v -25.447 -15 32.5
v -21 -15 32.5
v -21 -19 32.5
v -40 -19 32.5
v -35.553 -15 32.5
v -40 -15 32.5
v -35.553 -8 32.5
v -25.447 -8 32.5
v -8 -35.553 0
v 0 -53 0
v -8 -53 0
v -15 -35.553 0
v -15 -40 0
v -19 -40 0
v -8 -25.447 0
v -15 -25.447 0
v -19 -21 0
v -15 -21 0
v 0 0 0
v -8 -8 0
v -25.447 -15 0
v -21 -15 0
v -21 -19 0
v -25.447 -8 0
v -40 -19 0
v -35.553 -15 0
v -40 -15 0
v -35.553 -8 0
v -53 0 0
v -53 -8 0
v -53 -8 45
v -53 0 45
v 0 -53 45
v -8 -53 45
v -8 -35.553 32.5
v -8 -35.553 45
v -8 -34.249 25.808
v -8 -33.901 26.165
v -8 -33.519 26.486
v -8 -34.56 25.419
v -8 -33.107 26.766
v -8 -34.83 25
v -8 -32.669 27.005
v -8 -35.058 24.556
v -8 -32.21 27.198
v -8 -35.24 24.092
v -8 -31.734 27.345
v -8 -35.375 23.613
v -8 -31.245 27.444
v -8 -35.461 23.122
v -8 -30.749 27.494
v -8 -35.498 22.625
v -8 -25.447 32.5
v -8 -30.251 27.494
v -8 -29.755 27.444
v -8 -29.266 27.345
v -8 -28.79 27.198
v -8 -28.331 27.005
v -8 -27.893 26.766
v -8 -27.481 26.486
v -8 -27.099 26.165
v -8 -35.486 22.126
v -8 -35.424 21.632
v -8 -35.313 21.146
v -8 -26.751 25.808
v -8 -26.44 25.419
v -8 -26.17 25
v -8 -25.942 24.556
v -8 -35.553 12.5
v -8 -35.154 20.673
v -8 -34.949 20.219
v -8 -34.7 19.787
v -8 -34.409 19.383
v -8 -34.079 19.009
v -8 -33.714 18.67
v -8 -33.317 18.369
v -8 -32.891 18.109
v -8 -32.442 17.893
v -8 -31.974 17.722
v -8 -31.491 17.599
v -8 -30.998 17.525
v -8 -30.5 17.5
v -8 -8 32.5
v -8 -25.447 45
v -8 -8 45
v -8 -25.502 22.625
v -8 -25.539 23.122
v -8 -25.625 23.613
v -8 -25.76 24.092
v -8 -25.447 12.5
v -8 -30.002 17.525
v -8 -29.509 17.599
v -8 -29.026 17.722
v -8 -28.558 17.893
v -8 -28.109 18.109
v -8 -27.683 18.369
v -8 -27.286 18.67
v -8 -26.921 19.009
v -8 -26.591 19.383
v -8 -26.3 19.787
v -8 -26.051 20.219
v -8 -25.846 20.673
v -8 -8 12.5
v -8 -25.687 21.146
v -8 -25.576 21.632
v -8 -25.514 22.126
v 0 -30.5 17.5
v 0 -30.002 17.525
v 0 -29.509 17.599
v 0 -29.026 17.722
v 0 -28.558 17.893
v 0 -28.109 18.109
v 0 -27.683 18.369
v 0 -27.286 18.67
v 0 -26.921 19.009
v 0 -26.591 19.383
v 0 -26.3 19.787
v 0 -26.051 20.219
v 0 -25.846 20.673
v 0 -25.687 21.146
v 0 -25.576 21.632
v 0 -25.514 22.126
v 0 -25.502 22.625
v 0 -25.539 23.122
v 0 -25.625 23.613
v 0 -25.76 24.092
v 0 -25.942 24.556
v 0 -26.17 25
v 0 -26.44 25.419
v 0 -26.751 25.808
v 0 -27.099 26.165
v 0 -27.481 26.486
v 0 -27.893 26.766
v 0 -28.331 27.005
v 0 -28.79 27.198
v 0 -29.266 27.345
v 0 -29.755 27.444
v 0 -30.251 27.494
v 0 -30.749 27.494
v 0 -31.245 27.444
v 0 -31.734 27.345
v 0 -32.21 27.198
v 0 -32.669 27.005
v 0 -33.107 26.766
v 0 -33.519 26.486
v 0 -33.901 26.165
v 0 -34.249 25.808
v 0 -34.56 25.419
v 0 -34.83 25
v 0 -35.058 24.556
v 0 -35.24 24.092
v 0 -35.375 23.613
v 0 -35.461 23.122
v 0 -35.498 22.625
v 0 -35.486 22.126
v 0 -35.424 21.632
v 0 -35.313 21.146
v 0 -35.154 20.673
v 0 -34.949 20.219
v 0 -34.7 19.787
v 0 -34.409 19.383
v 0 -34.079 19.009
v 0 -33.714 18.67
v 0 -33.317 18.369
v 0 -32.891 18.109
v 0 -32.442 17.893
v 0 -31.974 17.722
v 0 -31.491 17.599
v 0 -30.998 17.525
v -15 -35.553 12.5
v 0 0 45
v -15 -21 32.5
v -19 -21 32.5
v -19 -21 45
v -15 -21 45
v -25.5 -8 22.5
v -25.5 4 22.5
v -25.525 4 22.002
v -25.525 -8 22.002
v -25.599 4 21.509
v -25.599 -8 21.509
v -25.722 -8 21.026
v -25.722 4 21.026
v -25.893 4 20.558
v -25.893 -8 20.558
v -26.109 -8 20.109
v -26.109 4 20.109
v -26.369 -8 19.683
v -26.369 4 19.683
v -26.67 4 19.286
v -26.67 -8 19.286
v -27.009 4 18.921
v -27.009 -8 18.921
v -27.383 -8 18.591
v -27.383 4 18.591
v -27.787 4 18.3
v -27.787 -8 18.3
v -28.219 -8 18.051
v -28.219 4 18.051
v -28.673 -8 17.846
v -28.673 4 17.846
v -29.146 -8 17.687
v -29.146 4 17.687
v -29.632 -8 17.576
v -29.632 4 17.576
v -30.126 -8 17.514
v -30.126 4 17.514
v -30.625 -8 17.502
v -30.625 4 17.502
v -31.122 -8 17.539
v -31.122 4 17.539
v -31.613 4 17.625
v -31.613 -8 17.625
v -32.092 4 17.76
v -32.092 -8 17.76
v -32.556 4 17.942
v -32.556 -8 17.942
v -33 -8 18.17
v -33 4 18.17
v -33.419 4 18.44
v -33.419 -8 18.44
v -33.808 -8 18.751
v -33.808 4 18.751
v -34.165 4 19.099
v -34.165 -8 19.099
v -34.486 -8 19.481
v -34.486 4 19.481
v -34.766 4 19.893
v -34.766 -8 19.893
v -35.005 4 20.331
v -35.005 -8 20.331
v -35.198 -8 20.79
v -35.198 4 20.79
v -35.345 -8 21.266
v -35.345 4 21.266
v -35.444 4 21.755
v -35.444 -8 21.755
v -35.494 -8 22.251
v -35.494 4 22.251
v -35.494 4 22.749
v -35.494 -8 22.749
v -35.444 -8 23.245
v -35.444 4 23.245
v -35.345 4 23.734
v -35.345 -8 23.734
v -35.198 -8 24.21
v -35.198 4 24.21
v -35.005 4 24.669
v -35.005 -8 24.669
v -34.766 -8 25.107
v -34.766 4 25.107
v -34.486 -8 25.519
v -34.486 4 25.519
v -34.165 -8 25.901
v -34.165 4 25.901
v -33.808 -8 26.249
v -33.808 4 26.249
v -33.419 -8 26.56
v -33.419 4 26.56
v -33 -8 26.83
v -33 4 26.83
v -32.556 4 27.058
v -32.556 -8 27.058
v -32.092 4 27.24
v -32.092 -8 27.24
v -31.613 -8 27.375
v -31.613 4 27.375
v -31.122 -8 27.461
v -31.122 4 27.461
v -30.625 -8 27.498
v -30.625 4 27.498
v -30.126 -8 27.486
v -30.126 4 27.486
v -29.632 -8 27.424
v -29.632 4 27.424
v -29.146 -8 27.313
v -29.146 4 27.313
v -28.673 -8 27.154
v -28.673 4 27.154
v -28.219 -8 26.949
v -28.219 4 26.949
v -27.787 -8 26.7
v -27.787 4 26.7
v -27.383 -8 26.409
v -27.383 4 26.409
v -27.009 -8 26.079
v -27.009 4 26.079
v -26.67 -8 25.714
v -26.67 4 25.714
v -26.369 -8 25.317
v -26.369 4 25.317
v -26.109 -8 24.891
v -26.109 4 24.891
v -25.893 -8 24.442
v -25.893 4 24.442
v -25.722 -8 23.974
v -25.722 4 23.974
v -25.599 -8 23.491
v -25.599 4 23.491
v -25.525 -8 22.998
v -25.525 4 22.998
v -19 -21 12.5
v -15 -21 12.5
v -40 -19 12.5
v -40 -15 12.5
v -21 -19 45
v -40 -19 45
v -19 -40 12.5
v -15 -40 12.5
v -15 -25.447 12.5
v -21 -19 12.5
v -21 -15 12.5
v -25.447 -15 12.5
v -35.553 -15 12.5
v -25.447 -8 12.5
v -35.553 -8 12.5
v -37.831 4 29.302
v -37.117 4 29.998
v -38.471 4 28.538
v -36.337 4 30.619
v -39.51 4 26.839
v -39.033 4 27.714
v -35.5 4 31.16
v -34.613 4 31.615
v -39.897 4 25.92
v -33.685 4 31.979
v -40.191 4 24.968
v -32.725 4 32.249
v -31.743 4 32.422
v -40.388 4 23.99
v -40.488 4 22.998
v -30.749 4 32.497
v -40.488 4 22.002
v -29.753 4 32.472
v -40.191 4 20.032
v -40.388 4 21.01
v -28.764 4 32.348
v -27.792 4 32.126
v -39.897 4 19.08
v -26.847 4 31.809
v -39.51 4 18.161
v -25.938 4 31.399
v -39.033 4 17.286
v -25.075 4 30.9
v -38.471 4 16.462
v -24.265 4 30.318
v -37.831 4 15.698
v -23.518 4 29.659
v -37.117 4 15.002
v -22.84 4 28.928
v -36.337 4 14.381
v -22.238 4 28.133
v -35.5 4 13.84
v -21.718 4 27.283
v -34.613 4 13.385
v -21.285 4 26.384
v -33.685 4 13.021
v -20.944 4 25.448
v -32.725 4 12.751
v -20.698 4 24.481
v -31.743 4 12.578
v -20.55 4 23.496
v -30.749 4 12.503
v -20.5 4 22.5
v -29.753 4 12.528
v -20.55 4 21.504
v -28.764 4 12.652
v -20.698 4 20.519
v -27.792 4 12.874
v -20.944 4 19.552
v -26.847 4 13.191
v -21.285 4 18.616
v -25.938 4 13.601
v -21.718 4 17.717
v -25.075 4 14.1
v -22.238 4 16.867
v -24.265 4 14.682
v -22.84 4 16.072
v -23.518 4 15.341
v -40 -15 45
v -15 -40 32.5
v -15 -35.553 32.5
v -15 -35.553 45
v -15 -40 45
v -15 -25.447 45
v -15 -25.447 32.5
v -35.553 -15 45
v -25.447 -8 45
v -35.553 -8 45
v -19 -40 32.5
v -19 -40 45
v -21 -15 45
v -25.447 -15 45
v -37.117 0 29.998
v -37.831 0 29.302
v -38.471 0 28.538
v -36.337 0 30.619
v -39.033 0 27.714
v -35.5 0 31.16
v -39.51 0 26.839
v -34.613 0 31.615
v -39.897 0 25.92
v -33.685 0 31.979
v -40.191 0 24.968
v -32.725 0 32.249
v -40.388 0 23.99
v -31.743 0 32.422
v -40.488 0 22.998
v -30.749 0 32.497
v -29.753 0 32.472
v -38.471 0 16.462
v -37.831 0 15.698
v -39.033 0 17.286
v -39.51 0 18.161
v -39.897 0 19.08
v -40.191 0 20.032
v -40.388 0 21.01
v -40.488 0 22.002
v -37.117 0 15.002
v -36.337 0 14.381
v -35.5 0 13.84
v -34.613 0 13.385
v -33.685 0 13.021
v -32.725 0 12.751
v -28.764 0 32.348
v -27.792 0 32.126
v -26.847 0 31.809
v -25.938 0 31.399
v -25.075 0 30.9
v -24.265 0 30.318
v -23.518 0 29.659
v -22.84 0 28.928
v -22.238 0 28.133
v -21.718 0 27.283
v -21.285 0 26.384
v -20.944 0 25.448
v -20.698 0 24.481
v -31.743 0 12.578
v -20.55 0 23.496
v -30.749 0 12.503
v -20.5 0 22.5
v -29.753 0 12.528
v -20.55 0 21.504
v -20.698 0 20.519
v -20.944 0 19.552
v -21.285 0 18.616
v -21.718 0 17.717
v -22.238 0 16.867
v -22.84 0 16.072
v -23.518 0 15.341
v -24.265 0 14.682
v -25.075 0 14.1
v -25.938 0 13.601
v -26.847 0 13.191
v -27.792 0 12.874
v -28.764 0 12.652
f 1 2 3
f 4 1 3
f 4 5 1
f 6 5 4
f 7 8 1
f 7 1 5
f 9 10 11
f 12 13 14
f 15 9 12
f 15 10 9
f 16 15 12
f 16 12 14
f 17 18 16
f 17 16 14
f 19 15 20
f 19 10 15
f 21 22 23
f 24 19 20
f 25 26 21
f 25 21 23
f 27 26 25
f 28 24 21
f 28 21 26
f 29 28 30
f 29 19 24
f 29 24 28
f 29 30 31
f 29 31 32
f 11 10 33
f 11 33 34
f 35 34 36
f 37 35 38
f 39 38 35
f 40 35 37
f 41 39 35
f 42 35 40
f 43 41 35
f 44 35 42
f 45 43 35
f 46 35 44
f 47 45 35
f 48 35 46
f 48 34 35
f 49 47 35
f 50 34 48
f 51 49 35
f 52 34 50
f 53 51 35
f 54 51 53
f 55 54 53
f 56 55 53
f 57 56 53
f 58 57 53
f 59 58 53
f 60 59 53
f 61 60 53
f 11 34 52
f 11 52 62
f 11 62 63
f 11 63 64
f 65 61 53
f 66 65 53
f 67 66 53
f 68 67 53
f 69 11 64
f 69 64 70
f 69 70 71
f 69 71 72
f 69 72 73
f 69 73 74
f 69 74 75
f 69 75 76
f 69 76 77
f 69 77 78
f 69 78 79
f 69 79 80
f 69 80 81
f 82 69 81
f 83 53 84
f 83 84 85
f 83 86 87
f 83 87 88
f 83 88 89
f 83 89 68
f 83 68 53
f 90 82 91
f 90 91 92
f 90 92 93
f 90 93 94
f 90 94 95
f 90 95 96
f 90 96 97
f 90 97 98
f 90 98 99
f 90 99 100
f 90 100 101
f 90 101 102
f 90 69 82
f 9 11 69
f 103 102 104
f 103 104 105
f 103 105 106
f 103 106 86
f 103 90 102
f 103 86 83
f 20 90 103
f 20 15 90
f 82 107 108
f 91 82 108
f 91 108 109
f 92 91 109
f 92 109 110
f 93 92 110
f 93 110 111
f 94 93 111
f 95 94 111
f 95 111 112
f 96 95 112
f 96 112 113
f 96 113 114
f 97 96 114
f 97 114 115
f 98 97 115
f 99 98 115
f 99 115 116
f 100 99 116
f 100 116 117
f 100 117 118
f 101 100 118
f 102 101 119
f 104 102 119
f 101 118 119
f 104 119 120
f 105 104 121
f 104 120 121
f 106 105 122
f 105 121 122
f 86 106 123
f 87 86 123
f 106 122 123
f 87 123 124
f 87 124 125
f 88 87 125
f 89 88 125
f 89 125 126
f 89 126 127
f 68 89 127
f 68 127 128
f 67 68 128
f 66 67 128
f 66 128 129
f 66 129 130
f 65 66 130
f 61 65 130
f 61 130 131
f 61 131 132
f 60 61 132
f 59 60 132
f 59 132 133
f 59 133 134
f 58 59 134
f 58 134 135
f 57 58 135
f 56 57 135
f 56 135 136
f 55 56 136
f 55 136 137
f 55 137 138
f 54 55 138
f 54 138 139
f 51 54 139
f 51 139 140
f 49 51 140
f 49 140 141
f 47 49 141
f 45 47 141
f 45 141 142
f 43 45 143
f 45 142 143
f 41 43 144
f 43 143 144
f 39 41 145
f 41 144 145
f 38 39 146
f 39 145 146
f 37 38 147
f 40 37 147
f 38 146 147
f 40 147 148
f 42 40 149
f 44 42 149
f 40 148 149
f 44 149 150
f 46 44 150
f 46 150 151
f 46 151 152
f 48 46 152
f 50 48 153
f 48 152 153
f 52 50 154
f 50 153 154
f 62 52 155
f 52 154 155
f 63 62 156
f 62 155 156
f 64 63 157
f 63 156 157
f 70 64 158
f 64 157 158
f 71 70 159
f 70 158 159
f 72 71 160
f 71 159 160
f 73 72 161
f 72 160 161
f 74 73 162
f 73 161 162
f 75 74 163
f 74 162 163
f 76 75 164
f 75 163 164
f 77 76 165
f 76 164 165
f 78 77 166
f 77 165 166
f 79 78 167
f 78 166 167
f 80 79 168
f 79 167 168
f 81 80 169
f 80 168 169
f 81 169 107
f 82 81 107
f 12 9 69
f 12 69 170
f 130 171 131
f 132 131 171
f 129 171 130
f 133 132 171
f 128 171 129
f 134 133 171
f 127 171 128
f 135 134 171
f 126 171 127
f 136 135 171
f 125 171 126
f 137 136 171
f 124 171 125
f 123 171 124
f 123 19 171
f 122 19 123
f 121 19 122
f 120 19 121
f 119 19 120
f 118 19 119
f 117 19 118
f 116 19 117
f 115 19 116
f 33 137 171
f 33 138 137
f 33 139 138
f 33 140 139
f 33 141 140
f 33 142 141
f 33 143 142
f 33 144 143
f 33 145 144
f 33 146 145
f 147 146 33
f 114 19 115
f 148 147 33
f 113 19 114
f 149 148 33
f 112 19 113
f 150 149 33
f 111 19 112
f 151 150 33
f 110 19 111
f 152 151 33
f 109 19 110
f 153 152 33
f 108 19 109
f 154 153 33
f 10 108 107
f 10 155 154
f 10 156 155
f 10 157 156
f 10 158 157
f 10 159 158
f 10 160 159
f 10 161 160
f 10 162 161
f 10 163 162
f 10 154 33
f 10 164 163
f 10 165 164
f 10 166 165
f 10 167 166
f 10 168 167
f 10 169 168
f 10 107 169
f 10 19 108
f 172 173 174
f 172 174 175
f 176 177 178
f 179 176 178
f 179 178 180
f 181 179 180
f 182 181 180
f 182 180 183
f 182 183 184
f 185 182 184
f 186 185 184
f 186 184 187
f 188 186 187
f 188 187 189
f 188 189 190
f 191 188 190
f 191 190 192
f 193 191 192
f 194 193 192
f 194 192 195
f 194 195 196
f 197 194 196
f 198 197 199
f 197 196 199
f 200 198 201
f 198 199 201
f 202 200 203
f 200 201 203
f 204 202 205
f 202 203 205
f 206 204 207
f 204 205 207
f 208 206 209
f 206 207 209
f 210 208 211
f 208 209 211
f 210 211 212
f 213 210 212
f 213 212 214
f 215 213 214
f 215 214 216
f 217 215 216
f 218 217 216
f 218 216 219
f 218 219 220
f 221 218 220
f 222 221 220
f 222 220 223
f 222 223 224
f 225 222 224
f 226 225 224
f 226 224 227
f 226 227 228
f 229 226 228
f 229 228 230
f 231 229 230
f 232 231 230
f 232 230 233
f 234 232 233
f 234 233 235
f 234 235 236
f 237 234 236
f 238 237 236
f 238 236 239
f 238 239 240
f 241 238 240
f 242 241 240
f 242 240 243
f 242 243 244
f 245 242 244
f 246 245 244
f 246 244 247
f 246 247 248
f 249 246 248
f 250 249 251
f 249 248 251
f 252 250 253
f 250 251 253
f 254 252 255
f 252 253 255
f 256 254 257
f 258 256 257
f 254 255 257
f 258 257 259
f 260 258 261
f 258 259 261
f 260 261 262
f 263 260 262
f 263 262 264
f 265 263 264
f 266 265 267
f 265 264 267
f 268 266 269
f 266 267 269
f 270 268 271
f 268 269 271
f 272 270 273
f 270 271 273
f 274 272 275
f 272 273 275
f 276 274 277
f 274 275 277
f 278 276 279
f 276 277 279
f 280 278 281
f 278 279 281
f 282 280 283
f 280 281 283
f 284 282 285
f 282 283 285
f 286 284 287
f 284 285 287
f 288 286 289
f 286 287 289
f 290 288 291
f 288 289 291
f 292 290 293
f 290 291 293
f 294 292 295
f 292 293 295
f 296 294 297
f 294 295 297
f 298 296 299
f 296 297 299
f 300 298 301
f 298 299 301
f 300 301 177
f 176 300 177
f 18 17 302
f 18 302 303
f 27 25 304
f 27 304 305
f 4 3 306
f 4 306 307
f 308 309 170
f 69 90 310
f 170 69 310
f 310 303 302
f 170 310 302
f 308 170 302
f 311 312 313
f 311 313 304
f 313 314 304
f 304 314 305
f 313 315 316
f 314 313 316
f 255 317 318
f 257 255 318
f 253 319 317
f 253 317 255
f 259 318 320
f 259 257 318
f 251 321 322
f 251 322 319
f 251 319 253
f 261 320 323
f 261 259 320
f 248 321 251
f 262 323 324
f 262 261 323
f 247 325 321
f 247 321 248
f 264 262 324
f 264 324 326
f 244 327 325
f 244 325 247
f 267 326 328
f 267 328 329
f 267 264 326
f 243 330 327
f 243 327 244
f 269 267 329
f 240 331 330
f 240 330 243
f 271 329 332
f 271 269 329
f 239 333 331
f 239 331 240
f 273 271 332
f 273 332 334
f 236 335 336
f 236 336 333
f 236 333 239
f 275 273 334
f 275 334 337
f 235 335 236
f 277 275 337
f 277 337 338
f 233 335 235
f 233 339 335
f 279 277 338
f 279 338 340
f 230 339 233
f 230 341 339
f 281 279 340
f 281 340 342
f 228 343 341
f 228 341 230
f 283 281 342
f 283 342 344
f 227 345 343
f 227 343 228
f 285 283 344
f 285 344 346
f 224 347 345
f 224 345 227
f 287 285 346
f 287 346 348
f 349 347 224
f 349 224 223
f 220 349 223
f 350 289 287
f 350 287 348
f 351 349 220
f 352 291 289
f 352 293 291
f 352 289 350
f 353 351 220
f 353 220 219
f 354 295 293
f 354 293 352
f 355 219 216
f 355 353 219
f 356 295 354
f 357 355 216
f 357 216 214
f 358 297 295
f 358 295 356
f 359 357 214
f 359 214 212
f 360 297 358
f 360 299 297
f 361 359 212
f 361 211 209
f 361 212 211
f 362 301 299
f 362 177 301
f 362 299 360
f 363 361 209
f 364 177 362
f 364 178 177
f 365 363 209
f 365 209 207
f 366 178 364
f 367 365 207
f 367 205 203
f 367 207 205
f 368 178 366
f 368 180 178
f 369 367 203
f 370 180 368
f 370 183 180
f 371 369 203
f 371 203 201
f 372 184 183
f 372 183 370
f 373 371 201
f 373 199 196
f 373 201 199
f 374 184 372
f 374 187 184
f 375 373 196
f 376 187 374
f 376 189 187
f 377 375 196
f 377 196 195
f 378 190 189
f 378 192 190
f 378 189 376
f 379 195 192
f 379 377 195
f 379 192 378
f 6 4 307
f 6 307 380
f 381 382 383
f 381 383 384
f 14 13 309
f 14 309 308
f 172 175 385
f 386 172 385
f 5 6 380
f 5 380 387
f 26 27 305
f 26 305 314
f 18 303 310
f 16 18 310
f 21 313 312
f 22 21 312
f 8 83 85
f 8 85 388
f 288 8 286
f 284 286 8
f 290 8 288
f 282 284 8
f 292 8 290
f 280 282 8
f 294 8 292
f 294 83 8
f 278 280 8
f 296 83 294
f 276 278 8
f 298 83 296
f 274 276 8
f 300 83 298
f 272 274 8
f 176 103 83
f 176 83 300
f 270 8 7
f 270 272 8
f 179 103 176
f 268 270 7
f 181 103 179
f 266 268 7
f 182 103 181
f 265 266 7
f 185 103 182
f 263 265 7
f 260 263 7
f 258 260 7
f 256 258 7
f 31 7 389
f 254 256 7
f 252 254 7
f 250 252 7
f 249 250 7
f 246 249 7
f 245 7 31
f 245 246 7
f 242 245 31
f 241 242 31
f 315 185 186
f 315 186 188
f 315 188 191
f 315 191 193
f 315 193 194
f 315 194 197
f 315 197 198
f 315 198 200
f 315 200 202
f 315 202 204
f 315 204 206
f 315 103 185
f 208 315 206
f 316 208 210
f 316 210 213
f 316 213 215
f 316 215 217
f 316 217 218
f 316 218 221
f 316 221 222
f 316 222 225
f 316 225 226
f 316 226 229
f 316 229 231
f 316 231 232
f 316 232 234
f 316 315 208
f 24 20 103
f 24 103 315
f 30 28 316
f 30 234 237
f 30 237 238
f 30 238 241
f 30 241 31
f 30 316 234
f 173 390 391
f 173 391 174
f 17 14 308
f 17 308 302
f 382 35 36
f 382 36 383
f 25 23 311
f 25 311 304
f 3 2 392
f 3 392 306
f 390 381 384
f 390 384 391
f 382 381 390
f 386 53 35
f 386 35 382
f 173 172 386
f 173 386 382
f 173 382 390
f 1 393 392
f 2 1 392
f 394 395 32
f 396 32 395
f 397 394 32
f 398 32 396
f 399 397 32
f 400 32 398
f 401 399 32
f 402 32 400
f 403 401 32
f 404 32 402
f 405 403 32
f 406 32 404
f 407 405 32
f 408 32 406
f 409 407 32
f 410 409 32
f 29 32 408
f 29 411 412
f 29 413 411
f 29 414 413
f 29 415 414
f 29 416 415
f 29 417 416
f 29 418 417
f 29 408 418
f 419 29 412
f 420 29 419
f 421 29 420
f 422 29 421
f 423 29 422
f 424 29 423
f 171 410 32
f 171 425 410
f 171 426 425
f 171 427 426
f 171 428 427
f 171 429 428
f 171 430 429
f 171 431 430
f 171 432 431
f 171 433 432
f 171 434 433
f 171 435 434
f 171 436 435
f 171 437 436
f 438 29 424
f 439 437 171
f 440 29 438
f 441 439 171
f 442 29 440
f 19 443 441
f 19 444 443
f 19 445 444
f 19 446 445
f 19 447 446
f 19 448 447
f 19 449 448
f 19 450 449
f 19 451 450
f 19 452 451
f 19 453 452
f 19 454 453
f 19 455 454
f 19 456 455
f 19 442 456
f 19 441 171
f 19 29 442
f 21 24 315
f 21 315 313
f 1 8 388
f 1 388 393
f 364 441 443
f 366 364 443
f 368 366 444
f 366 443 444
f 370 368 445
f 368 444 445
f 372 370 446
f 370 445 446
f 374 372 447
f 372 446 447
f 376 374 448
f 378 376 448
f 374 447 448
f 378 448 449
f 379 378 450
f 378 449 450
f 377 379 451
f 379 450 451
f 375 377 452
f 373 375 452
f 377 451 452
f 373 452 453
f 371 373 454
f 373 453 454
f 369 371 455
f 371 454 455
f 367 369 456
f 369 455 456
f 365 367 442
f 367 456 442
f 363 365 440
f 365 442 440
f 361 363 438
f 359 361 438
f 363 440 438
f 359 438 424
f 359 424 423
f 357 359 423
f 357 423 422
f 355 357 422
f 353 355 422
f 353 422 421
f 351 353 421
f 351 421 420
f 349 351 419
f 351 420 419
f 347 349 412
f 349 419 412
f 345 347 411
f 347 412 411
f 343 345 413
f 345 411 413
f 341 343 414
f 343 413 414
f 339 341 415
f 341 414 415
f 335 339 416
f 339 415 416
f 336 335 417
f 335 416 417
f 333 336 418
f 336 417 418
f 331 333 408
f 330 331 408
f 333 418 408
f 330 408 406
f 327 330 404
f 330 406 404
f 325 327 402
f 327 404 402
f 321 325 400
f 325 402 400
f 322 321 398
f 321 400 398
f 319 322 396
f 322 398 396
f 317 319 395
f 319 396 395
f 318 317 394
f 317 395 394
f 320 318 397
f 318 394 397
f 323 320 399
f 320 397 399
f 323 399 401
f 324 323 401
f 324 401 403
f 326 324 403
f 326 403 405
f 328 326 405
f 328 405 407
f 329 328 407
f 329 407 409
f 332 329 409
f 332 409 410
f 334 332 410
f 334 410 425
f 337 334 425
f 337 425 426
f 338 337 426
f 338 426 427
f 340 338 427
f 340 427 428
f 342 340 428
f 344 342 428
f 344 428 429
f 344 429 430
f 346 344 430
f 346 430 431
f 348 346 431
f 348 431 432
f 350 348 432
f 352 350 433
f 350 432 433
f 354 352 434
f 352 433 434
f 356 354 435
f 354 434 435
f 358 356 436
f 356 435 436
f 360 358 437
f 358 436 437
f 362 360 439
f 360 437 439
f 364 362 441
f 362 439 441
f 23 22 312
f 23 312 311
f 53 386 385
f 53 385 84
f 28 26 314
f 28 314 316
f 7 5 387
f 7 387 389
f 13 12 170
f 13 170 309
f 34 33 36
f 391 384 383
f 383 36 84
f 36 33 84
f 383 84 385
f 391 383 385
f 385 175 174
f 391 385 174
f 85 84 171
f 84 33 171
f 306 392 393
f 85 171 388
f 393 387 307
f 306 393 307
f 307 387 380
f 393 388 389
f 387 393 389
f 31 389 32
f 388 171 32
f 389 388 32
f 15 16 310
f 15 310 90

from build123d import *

# Parameters (mm, degrees)
BOSS_EXTRU_1_DEPTH      = 45
ENL_V_MAT_EXTRU_1_REACH = 55
ESQUISSE2_R             = 5
ENL_V_START             = -12.5
ESQUISSE3_W             = 37.334250657
ESQUISSE3_H             = 36.0198364
ENL_V_MAT_EXTRU_2_DEPTH = 20
ESQUISSE4_R             = 10
BOSS_EXTRU_2_DEPTH      = 4
ENL_V_MAT_EXTRU_3_REACH = 59
ESQUISSE5_R             = 5


with BuildPart() as part:
    # Esquisse1 → Boss.-Extru.1 (new body)
    with BuildSketch(Plane.XY):
        Polygon((-53, 0), (0, 0), (0, -53), (-8, -53), (-8, -35.552659183), (-15, -35.552659183), (-15, -40), (-19, -40), (-19, -21), (-15, -21), (-15, -25.447340817), (-8, -25.447340817), (-8, -8), (-25.447340817, -8), (-25.447340817, -15), (-21, -15), (-21, -19), (-40, -19), (-40, -15), (-35.552659183, -15), (-35.552659183, -8), (-53, -8), align=None)
    extrude(amount=BOSS_EXTRU_1_DEPTH)

    # Esquisse2 → Enlèv. mat.-Extru.1 (cut, up to next)
    with BuildSketch(Plane(origin=(0, 0, 0), x_dir=(0, 0, -1), z_dir=(1, 0, 0)), mode=Mode.PRIVATE) as enl_v_mat_extru_1_sk1:
        with Locations((-22.5, -30.5)):
            Circle(ESQUISSE2_R)
    enl_v_mat_extru_1_tool1 = extrude(enl_v_mat_extru_1_sk1.sketch, amount=-ENL_V_MAT_EXTRU_1_REACH, mode=Mode.PRIVATE) & part.part
    add(enl_v_mat_extru_1_tool1.solids().sort_by_distance((0, -30.5, 22.5))[0], mode=Mode.SUBTRACT)

    # Esquisse3 → Enlèv. mat.-Extru.2 (cut)
    with BuildSketch(Plane(origin=(0, 0, 0), x_dir=(-1, 0, 0), z_dir=(0, 0, -1)).offset(ENL_V_START)):
        with Locations((26.667125329, -26.0099182)):
            Rectangle(ESQUISSE3_W, ESQUISSE3_H)
    extrude(amount=-ENL_V_MAT_EXTRU_2_DEPTH, mode=Mode.SUBTRACT)

    # Esquisse4 → Boss.-Extru.2 (add)
    with BuildSketch(Plane(origin=(0, 0, 0), x_dir=(1, 0, 0), z_dir=(0, 1, 0))):
        with Locations((-30.5, -22.5)):
            Circle(ESQUISSE4_R)
    extrude(amount=BOSS_EXTRU_2_DEPTH)

    # Esquisse5 → Enlèv. mat.-Extru.3 (cut, up to next)
    with BuildSketch(Plane(origin=(0, 4, 0), x_dir=(1, 0, 0), z_dir=(0, 1, 0)), mode=Mode.PRIVATE) as enl_v_mat_extru_3_sk1:
        with Locations((-30.5, -22.5)):
            Circle(ESQUISSE5_R)
    enl_v_mat_extru_3_tool1 = extrude(enl_v_mat_extru_3_sk1.sketch, amount=-ENL_V_MAT_EXTRU_3_REACH, mode=Mode.PRIVATE) & part.part
    add(enl_v_mat_extru_3_tool1.solids().sort_by_distance((-30.5, 4, 22.5))[0], mode=Mode.SUBTRACT)


solid = part.part
